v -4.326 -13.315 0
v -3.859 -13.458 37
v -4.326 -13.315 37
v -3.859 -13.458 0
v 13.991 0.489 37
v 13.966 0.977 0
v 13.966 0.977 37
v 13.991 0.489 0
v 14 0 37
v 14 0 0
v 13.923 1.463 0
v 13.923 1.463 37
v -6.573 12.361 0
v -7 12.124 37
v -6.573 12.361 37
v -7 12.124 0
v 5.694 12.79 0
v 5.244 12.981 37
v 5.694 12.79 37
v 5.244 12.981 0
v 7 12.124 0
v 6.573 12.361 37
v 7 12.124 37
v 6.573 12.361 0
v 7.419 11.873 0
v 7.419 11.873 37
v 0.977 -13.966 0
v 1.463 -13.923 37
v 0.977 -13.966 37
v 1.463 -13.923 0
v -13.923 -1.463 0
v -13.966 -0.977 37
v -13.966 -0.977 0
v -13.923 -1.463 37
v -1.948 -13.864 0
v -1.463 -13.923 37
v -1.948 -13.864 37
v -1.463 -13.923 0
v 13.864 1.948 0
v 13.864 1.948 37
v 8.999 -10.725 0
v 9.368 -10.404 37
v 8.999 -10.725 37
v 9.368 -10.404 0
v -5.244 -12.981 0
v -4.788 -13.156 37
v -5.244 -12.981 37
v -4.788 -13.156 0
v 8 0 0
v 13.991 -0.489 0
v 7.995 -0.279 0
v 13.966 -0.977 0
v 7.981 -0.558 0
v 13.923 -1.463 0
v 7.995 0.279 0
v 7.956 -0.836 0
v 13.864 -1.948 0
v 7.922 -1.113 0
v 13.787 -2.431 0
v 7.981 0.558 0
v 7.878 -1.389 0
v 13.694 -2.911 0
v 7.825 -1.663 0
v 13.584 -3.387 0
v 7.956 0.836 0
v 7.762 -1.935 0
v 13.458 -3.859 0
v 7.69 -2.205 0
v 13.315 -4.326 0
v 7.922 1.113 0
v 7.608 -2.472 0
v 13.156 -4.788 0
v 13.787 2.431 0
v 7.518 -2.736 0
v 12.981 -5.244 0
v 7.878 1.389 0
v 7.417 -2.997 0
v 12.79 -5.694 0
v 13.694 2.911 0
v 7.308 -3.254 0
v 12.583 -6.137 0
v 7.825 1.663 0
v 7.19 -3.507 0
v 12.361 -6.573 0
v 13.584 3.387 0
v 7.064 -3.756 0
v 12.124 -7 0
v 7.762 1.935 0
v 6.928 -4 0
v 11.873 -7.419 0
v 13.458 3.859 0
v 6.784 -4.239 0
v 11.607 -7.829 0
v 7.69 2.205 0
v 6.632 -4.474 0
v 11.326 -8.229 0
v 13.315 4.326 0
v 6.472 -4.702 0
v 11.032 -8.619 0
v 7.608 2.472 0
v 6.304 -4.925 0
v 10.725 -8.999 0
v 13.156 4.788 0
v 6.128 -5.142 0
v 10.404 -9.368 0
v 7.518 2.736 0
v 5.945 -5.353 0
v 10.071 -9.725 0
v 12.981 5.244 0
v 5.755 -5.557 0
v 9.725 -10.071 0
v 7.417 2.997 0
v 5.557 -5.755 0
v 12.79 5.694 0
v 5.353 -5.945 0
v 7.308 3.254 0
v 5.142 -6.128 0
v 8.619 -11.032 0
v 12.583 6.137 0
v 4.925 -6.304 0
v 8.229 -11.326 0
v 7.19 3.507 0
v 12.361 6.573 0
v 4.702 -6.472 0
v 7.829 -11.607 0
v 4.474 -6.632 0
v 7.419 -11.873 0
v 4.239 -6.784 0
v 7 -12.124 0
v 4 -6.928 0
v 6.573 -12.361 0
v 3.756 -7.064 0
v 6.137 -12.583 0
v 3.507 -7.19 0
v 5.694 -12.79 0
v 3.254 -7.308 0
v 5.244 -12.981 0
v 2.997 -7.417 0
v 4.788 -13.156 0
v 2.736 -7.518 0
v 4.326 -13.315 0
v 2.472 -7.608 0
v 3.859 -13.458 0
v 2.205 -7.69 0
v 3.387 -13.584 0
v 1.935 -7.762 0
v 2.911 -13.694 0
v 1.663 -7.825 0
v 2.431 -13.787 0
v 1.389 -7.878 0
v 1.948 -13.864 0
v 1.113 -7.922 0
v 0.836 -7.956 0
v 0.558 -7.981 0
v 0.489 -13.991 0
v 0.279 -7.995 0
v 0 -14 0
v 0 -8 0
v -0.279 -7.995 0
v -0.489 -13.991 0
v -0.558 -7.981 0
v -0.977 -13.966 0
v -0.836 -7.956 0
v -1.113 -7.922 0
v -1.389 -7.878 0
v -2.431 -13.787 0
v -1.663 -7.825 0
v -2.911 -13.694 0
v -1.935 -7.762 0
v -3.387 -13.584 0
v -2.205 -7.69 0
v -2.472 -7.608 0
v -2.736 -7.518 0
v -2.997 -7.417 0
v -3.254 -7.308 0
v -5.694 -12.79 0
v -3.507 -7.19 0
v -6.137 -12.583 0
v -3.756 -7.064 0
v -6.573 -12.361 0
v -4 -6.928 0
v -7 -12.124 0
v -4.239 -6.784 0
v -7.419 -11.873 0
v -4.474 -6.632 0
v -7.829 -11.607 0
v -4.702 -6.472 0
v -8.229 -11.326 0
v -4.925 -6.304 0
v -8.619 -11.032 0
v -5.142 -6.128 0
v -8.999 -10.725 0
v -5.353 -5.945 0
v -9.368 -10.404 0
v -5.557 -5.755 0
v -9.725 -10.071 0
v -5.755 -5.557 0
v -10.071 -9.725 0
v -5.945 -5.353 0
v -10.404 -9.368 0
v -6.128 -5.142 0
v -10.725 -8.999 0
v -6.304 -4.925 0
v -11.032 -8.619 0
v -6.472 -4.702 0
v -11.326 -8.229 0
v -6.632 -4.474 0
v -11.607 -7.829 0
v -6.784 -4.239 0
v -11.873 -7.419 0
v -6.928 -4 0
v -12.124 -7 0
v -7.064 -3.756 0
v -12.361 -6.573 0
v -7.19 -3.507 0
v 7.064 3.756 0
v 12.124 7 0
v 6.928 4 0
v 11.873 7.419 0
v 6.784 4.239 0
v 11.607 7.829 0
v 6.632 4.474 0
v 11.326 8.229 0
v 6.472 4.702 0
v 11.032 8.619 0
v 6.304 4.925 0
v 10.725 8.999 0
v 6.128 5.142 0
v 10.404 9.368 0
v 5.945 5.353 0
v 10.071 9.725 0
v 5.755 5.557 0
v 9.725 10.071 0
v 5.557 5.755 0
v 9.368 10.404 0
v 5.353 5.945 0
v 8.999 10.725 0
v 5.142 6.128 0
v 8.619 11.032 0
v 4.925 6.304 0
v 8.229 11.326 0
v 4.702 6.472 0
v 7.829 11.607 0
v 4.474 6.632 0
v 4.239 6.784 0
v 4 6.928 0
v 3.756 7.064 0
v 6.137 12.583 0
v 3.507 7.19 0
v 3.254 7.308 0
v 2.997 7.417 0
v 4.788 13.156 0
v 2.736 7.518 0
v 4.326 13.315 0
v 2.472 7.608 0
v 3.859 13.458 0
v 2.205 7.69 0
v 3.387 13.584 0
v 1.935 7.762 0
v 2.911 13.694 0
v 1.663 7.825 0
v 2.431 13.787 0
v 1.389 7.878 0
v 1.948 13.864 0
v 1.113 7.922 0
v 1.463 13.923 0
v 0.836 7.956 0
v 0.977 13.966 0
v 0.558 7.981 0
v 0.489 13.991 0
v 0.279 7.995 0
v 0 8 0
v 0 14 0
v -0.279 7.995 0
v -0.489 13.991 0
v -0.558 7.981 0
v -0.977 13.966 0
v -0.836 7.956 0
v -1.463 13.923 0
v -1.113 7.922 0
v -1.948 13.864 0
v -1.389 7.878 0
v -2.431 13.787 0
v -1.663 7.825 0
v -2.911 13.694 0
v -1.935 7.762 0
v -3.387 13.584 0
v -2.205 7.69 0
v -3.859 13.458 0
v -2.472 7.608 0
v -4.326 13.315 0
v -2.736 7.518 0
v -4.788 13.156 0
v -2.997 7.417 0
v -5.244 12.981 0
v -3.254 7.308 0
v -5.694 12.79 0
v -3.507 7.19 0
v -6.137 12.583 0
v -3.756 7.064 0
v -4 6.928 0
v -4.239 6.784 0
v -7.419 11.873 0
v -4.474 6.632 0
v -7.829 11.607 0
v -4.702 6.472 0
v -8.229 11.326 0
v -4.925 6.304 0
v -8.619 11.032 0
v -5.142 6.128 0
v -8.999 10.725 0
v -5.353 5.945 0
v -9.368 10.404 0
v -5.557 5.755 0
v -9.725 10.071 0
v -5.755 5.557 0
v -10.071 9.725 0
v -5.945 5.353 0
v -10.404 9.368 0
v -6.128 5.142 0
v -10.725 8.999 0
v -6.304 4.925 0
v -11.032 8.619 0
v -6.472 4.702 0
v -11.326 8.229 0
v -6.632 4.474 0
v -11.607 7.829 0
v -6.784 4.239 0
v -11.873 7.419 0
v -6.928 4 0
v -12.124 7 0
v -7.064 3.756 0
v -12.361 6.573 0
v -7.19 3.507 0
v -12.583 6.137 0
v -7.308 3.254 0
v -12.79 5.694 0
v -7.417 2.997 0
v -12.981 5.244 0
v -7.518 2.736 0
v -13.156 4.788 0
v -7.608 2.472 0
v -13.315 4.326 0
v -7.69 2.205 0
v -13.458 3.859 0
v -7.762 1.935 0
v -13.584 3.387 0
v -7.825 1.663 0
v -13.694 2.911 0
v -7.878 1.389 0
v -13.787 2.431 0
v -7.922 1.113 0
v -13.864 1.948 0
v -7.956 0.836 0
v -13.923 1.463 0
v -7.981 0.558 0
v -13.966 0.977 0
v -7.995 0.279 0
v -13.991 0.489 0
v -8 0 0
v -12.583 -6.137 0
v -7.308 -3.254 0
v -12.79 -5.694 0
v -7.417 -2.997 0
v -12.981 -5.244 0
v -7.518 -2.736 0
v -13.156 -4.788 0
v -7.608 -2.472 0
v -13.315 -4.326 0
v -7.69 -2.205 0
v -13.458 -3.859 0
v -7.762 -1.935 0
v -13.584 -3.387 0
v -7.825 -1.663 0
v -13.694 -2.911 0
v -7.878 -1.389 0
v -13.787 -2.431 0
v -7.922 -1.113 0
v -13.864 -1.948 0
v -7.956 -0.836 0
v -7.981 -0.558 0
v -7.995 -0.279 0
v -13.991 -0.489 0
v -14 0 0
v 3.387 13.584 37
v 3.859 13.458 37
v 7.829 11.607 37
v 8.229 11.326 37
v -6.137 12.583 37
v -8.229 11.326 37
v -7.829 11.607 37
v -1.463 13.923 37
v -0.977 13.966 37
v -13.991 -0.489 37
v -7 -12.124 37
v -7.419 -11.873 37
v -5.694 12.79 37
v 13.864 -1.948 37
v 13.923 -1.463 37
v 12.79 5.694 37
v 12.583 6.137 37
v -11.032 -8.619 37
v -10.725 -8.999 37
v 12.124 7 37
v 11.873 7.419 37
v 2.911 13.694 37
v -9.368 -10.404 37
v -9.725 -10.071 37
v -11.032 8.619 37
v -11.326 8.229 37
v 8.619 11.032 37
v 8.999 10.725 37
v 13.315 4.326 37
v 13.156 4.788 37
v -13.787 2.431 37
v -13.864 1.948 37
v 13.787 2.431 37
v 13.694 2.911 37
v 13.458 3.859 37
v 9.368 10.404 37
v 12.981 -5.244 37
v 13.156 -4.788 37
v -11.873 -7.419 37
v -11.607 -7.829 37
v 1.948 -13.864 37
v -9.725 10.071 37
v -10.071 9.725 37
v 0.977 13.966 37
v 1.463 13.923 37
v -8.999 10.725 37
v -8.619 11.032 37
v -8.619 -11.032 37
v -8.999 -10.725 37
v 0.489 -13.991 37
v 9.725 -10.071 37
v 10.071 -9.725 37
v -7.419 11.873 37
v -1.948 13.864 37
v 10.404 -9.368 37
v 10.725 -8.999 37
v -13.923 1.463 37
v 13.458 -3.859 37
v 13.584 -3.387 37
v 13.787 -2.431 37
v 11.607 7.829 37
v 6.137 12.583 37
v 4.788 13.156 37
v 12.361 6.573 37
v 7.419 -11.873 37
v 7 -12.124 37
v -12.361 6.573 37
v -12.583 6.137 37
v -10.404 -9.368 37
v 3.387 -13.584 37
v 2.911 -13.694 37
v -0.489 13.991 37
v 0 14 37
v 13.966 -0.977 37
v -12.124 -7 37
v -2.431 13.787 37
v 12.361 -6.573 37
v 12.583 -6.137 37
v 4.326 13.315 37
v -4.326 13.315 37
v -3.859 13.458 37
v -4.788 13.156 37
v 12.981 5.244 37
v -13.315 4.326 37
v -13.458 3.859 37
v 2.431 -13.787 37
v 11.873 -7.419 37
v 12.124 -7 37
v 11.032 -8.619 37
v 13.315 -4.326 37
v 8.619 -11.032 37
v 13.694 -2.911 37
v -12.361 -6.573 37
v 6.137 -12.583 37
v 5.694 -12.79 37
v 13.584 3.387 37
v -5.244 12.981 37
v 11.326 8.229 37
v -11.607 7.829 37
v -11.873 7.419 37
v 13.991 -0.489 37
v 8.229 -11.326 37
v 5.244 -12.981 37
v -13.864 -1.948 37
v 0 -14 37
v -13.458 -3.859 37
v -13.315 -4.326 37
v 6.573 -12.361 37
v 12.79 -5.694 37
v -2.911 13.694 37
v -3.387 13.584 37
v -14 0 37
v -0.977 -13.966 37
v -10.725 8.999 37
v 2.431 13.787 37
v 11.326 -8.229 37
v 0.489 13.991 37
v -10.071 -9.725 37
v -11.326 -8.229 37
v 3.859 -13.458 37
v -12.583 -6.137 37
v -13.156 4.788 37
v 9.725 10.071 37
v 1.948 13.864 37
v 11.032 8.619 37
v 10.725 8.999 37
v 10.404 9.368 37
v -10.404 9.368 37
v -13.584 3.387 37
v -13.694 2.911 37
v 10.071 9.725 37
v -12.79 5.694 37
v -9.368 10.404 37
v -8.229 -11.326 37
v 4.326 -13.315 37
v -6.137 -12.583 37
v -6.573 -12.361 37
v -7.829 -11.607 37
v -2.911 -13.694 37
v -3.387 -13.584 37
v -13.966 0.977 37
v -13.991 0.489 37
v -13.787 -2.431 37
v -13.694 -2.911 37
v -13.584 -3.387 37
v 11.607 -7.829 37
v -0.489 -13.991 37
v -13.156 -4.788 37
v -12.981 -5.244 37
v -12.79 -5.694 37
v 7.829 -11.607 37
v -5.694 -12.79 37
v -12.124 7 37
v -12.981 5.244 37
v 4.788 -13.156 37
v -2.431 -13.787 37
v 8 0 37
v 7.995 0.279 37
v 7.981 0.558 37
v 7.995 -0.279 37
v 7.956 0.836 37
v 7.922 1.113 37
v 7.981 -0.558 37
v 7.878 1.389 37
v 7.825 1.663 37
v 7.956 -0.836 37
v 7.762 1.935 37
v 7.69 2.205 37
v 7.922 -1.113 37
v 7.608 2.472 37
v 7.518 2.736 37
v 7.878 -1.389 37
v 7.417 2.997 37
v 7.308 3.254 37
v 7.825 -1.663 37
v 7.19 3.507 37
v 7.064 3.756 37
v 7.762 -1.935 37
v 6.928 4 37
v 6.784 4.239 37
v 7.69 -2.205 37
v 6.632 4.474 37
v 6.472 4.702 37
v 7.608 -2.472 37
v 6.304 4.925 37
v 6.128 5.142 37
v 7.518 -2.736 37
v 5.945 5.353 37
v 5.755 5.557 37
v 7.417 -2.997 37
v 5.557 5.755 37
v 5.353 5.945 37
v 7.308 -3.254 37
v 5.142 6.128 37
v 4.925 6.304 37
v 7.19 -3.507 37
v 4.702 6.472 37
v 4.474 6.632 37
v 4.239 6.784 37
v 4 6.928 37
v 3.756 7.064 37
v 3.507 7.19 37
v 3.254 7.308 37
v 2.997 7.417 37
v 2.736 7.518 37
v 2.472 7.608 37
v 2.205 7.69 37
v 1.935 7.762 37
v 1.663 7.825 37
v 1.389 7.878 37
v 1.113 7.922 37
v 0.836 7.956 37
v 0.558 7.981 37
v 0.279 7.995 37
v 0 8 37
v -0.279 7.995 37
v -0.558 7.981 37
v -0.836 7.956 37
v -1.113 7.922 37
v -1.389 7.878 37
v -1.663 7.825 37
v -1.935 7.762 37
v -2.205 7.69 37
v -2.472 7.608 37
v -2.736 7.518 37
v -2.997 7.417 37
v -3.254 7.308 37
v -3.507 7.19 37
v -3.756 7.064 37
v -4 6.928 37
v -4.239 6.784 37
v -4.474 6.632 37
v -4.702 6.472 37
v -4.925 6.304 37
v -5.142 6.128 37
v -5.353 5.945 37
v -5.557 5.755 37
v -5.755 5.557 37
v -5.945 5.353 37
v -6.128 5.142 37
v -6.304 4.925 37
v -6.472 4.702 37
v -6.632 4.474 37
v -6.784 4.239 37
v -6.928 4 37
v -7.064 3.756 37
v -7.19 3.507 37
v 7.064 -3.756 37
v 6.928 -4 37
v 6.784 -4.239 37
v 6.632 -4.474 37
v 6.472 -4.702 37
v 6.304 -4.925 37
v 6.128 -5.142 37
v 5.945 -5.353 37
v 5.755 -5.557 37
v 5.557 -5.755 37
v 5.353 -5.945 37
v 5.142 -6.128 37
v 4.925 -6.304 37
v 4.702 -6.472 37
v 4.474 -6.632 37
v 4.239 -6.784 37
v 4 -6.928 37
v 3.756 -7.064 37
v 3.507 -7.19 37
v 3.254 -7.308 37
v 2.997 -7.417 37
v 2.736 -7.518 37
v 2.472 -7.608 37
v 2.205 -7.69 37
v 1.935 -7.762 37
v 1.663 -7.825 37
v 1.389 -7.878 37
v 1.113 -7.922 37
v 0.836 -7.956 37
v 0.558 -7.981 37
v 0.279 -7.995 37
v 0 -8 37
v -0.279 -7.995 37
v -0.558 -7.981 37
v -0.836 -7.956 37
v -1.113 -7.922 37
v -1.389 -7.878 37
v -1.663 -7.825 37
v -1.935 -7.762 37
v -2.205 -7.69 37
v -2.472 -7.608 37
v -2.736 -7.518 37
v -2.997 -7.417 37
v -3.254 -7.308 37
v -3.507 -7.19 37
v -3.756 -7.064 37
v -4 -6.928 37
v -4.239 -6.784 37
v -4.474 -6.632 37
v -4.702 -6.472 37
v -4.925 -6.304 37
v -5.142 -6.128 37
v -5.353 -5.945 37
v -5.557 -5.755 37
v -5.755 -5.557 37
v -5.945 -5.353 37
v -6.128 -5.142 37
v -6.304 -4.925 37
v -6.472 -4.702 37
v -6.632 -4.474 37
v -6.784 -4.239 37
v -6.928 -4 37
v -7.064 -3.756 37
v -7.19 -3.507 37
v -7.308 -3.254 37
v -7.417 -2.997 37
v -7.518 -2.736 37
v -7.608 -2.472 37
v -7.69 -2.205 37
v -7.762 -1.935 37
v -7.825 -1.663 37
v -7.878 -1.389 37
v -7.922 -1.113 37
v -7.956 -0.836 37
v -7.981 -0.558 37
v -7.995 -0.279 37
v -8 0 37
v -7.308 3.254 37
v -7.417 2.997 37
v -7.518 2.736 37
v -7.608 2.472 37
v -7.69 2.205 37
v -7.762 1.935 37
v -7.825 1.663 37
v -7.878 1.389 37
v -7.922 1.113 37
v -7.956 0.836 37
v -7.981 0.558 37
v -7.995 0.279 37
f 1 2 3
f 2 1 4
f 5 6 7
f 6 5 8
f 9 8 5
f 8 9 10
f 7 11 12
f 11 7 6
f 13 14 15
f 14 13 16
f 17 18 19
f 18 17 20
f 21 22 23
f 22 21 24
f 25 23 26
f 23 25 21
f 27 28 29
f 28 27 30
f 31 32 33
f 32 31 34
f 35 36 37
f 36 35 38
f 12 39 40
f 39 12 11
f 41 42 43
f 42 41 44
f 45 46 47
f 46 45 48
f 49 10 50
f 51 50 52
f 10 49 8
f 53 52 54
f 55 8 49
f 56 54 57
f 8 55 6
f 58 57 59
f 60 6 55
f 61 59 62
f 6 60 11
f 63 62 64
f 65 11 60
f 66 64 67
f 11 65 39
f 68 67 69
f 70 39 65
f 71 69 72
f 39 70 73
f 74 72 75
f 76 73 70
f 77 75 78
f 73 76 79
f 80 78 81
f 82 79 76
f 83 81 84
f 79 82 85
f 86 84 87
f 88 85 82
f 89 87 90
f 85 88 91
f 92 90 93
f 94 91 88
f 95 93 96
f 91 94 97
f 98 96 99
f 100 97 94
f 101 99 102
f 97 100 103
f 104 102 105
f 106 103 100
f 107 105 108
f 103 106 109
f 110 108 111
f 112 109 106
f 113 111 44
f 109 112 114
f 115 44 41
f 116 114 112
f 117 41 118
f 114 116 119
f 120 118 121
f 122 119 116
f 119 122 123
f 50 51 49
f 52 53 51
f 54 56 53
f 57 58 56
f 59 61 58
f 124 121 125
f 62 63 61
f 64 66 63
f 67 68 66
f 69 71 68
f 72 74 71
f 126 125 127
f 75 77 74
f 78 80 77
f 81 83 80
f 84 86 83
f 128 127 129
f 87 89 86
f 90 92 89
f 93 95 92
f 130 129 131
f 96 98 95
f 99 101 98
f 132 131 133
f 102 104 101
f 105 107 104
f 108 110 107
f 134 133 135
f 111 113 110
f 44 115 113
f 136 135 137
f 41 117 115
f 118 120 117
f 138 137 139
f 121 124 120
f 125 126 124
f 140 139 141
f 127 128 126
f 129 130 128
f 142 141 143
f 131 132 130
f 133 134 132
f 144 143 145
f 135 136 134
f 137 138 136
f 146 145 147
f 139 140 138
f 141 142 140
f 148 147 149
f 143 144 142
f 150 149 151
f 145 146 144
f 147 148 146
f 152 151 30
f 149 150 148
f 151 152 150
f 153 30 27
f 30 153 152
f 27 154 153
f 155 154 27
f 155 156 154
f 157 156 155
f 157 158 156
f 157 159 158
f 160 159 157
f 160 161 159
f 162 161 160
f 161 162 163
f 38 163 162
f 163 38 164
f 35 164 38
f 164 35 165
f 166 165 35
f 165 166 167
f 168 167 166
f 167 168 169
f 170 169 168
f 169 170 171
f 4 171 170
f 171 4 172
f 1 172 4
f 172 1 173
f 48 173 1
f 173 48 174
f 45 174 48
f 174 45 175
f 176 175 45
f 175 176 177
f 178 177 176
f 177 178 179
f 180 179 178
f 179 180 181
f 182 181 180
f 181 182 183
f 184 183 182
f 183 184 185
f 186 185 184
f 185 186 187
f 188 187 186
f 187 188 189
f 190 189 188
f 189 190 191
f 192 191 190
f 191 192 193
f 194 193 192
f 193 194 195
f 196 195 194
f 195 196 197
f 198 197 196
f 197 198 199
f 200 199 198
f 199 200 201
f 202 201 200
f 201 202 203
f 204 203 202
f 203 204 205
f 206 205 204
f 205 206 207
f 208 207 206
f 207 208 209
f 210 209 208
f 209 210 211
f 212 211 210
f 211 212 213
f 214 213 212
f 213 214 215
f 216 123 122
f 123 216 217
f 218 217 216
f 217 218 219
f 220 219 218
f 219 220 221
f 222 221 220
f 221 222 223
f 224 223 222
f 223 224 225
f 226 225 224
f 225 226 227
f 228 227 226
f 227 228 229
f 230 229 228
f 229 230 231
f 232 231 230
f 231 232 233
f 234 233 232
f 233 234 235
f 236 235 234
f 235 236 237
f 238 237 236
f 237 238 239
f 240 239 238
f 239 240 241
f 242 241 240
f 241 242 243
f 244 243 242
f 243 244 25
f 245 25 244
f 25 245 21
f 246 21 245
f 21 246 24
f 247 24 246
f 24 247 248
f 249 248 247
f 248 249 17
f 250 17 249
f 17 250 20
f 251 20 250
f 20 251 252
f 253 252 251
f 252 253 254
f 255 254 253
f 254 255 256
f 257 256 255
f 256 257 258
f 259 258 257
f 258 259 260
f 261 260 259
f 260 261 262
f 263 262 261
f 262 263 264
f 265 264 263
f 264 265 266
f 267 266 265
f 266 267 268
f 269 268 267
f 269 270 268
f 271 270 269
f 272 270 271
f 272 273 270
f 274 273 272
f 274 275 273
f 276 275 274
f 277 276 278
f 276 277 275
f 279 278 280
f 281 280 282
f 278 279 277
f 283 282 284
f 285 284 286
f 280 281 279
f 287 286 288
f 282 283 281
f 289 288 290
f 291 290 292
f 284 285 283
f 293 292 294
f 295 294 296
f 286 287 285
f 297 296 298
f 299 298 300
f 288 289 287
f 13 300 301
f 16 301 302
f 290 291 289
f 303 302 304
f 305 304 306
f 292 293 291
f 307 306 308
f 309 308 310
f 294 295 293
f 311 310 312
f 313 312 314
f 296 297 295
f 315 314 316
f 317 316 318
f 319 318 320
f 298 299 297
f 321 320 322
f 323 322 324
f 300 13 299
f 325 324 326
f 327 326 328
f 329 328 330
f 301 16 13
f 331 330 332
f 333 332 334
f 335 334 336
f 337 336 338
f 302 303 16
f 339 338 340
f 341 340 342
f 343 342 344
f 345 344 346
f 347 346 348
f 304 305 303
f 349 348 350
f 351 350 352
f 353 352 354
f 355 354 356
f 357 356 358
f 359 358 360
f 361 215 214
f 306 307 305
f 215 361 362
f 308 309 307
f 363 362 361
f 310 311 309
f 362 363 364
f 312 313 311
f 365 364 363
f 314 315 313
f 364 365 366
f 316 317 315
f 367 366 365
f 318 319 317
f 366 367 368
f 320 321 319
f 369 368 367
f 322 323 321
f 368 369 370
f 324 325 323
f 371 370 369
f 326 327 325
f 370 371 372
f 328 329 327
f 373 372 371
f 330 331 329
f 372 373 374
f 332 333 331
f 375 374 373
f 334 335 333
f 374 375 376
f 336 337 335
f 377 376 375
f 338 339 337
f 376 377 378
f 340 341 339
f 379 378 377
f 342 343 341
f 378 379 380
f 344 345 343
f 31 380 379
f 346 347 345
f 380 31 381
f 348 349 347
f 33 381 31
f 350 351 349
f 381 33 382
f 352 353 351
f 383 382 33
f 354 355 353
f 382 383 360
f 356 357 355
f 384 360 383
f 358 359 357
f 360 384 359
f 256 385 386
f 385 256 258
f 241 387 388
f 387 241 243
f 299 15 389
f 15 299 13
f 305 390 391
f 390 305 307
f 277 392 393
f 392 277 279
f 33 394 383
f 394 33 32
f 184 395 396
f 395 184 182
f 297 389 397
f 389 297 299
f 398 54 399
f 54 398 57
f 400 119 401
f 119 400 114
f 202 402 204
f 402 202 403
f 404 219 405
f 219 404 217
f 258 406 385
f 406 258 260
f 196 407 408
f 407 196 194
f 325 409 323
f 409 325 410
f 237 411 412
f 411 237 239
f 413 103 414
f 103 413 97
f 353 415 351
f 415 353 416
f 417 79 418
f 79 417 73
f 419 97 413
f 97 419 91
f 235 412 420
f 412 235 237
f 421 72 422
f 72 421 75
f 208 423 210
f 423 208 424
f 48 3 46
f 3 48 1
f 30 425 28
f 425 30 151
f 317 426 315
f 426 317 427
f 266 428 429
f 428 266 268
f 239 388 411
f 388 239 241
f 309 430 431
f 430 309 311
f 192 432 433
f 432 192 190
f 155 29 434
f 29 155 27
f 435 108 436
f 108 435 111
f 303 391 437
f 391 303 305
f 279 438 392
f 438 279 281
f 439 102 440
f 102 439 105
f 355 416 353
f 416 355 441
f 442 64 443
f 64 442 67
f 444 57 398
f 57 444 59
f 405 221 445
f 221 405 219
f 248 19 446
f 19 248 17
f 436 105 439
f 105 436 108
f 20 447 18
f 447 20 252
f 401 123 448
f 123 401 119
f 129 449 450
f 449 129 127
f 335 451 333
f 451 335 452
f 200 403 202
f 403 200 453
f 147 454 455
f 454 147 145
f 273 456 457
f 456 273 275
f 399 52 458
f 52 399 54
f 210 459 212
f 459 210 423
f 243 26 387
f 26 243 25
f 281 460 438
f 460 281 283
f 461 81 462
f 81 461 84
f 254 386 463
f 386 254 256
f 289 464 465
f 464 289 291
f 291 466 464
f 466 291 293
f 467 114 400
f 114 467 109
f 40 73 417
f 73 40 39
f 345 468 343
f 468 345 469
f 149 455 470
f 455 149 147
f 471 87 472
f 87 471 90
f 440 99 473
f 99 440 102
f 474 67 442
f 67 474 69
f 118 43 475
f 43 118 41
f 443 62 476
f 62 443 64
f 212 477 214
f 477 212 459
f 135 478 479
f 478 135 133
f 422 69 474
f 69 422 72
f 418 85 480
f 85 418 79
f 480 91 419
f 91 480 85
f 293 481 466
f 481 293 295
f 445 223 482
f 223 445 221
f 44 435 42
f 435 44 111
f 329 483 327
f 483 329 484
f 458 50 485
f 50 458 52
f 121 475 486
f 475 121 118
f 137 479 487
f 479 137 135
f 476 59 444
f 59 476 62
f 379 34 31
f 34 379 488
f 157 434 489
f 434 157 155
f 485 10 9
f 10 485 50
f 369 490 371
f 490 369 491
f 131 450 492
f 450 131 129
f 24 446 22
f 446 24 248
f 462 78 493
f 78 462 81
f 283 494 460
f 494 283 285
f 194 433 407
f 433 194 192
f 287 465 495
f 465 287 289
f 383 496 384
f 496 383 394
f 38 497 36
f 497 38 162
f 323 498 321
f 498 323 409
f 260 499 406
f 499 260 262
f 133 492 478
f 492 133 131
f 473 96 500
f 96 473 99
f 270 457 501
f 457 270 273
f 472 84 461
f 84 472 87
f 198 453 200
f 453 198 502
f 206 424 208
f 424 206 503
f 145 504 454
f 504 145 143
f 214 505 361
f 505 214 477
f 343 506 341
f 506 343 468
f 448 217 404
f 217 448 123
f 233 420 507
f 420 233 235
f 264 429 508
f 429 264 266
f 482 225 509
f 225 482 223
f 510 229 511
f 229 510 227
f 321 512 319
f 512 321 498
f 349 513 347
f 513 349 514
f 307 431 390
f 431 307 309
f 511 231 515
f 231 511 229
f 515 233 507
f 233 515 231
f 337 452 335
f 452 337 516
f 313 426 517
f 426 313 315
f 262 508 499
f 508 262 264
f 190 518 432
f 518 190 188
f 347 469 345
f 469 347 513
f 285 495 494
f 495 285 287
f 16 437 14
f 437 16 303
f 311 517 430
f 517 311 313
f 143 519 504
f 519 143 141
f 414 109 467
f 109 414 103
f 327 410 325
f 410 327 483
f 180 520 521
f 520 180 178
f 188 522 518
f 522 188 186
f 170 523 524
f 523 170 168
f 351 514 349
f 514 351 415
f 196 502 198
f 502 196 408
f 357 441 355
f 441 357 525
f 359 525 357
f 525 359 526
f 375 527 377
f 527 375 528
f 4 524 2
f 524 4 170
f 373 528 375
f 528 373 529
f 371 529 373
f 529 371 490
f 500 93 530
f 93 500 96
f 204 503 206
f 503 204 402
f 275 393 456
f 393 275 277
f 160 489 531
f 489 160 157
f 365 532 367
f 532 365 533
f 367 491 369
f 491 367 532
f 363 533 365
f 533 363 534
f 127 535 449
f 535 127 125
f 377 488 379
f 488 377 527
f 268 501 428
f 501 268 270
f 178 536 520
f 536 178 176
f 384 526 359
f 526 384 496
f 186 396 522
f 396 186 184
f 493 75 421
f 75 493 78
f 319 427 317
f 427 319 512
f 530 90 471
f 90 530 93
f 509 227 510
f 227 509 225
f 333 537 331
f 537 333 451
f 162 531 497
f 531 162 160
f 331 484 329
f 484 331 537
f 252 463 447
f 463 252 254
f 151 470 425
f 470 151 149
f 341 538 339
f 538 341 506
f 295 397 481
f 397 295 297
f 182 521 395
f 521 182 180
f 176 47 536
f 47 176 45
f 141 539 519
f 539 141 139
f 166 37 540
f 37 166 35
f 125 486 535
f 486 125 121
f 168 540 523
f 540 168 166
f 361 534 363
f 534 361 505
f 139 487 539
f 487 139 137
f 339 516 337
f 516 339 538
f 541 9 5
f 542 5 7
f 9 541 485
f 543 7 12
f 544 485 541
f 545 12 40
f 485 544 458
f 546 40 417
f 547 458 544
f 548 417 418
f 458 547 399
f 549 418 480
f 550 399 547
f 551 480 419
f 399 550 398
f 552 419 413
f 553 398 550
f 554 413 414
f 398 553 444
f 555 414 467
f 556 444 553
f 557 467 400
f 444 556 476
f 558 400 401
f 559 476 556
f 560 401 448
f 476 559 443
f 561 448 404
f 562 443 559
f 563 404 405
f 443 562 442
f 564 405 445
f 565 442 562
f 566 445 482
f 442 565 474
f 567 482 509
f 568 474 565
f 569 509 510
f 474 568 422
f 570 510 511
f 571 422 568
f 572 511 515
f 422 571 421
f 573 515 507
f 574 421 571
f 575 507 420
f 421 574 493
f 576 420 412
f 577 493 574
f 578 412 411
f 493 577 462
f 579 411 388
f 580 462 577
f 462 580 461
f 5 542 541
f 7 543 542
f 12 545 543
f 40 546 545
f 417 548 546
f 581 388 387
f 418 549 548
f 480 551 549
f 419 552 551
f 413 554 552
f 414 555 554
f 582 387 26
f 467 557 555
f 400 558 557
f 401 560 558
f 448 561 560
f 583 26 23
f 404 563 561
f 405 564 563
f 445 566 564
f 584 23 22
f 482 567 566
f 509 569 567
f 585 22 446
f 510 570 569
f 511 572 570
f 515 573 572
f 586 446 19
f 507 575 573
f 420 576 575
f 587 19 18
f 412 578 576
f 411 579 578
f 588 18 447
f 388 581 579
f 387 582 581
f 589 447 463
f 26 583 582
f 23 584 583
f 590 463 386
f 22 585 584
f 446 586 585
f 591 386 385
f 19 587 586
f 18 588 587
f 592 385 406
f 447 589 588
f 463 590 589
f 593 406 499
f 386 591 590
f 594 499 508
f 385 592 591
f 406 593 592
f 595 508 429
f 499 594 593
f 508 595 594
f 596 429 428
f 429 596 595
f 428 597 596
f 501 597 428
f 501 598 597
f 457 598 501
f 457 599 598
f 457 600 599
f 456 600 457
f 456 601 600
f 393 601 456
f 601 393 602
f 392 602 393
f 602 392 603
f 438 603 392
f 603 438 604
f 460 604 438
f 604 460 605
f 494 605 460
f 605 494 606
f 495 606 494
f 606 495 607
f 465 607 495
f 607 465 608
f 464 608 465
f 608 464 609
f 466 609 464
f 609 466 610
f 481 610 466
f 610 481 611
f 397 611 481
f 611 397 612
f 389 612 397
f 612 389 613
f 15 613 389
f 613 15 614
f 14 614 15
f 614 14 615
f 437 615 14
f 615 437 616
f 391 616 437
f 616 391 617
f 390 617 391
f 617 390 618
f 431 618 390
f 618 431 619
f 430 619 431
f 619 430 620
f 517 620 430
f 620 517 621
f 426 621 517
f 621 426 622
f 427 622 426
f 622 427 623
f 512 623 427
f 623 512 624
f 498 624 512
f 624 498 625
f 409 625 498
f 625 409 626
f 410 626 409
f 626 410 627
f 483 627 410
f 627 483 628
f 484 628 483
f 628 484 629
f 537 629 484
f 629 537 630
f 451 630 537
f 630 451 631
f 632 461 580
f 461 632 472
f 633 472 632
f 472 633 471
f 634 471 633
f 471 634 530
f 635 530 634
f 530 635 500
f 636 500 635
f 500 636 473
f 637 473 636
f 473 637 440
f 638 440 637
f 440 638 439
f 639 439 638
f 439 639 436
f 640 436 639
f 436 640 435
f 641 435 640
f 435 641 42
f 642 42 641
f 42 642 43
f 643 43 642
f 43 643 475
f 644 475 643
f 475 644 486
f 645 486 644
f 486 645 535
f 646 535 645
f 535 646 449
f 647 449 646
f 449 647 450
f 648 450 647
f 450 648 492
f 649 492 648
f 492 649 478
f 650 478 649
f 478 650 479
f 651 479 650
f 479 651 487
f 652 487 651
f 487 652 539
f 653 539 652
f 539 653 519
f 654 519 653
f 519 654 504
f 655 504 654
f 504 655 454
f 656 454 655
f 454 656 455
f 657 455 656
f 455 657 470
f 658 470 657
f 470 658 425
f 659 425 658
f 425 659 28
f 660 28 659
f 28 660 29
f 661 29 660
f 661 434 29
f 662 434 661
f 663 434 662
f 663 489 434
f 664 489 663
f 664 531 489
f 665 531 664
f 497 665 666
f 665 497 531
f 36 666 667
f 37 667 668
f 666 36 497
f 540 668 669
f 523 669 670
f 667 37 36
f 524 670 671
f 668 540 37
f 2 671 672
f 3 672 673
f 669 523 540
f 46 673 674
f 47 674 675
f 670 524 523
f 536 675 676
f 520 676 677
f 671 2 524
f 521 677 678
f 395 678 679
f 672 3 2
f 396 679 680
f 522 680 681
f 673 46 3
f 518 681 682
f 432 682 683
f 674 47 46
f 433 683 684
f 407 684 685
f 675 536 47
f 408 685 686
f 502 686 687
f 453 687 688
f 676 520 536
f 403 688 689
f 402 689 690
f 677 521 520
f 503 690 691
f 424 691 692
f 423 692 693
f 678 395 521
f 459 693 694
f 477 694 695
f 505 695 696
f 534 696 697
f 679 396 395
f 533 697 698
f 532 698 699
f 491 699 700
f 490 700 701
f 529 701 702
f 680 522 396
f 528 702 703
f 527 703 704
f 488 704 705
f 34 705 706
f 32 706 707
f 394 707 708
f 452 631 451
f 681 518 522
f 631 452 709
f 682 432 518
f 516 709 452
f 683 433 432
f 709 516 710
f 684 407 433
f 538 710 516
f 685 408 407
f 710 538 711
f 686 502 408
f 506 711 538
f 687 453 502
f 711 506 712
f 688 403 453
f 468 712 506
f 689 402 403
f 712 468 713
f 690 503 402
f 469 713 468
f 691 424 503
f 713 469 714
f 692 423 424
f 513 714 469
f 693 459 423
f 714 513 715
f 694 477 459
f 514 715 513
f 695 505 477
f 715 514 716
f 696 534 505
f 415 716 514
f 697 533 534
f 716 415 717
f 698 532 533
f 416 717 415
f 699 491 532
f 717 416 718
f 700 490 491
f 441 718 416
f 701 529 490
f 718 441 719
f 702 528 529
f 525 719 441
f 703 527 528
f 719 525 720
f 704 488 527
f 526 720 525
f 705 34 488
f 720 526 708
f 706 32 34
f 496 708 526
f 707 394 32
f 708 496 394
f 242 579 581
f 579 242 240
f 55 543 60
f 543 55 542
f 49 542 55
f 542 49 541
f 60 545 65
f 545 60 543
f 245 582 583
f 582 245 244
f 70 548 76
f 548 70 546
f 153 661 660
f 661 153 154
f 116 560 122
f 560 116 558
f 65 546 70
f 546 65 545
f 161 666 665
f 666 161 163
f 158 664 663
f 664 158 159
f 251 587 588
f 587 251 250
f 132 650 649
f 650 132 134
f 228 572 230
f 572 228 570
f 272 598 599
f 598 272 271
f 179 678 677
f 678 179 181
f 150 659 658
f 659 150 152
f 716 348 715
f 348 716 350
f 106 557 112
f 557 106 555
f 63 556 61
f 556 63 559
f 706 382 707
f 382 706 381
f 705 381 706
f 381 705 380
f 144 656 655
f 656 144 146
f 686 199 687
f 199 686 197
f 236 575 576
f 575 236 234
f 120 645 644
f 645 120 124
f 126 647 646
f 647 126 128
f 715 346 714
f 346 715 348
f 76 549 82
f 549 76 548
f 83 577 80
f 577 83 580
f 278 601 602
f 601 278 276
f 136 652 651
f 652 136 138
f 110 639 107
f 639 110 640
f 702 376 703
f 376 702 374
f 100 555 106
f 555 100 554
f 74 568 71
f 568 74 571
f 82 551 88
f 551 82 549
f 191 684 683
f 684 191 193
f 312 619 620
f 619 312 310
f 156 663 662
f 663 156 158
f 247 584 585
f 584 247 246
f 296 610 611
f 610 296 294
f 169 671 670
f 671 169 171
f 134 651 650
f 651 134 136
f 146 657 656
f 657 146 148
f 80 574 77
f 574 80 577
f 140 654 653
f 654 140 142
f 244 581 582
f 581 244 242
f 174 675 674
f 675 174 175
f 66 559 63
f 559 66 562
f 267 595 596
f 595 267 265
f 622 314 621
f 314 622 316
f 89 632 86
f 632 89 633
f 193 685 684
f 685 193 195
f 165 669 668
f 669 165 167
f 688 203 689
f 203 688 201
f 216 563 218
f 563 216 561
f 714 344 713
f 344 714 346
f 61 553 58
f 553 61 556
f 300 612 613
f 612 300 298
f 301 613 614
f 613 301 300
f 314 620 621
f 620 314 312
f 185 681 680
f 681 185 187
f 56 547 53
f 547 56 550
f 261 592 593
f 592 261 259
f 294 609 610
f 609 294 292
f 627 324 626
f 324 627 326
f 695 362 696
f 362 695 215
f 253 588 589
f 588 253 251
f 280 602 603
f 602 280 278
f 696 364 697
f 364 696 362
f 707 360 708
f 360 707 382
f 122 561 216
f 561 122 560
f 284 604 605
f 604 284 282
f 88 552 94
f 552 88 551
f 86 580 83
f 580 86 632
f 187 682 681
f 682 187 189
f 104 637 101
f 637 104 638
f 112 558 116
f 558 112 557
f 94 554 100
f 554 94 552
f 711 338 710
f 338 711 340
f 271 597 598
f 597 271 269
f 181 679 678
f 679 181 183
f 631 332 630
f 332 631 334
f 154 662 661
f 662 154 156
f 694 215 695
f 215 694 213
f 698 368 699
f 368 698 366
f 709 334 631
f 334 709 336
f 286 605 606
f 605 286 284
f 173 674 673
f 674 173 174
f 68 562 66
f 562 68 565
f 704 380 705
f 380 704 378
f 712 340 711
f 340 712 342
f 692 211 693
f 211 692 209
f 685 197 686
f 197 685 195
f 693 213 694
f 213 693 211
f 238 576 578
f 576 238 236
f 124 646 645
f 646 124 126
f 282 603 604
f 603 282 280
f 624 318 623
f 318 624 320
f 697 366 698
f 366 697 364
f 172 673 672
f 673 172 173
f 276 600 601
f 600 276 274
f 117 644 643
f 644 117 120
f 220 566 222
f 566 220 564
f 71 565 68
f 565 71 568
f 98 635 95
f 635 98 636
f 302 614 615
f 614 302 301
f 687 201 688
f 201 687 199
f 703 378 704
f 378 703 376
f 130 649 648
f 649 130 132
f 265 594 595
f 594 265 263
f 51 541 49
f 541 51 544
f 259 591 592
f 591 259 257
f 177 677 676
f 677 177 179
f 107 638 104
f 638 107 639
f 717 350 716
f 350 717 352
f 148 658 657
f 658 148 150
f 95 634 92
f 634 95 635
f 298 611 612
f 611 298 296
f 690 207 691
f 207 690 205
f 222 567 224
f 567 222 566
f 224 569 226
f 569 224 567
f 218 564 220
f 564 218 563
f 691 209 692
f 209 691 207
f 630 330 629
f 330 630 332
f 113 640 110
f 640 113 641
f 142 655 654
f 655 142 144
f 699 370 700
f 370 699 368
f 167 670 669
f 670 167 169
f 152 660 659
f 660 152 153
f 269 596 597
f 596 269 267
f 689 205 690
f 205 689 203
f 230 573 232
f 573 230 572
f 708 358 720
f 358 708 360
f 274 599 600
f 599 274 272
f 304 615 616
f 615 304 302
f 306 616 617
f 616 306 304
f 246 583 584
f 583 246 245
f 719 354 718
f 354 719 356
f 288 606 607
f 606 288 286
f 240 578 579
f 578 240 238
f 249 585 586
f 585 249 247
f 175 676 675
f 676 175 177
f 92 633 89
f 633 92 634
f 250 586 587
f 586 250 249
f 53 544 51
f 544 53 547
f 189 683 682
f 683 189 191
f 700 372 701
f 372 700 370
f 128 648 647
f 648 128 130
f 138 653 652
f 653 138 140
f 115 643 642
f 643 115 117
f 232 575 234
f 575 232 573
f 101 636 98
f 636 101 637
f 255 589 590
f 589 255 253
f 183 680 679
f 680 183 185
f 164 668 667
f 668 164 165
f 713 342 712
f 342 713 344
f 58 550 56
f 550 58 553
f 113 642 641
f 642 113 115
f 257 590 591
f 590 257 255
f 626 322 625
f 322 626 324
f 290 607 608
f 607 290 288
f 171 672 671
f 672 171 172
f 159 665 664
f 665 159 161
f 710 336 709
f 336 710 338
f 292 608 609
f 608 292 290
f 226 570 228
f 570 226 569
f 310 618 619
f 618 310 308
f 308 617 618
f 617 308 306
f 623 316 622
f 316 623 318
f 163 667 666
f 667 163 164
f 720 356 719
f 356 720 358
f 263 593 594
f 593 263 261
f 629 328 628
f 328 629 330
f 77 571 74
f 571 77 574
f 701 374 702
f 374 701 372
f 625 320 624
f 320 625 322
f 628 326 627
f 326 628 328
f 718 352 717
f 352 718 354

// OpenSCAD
$fn = 180;

bore_d = 16.0;
od_d   = 28.0;
len    = 37.0;

difference() {
  cylinder(d = od_d, h = len, center = false);
  translate([0,0,-0.1]) cylinder(d = bore_d, h = len + 0.2, center = false);
}
